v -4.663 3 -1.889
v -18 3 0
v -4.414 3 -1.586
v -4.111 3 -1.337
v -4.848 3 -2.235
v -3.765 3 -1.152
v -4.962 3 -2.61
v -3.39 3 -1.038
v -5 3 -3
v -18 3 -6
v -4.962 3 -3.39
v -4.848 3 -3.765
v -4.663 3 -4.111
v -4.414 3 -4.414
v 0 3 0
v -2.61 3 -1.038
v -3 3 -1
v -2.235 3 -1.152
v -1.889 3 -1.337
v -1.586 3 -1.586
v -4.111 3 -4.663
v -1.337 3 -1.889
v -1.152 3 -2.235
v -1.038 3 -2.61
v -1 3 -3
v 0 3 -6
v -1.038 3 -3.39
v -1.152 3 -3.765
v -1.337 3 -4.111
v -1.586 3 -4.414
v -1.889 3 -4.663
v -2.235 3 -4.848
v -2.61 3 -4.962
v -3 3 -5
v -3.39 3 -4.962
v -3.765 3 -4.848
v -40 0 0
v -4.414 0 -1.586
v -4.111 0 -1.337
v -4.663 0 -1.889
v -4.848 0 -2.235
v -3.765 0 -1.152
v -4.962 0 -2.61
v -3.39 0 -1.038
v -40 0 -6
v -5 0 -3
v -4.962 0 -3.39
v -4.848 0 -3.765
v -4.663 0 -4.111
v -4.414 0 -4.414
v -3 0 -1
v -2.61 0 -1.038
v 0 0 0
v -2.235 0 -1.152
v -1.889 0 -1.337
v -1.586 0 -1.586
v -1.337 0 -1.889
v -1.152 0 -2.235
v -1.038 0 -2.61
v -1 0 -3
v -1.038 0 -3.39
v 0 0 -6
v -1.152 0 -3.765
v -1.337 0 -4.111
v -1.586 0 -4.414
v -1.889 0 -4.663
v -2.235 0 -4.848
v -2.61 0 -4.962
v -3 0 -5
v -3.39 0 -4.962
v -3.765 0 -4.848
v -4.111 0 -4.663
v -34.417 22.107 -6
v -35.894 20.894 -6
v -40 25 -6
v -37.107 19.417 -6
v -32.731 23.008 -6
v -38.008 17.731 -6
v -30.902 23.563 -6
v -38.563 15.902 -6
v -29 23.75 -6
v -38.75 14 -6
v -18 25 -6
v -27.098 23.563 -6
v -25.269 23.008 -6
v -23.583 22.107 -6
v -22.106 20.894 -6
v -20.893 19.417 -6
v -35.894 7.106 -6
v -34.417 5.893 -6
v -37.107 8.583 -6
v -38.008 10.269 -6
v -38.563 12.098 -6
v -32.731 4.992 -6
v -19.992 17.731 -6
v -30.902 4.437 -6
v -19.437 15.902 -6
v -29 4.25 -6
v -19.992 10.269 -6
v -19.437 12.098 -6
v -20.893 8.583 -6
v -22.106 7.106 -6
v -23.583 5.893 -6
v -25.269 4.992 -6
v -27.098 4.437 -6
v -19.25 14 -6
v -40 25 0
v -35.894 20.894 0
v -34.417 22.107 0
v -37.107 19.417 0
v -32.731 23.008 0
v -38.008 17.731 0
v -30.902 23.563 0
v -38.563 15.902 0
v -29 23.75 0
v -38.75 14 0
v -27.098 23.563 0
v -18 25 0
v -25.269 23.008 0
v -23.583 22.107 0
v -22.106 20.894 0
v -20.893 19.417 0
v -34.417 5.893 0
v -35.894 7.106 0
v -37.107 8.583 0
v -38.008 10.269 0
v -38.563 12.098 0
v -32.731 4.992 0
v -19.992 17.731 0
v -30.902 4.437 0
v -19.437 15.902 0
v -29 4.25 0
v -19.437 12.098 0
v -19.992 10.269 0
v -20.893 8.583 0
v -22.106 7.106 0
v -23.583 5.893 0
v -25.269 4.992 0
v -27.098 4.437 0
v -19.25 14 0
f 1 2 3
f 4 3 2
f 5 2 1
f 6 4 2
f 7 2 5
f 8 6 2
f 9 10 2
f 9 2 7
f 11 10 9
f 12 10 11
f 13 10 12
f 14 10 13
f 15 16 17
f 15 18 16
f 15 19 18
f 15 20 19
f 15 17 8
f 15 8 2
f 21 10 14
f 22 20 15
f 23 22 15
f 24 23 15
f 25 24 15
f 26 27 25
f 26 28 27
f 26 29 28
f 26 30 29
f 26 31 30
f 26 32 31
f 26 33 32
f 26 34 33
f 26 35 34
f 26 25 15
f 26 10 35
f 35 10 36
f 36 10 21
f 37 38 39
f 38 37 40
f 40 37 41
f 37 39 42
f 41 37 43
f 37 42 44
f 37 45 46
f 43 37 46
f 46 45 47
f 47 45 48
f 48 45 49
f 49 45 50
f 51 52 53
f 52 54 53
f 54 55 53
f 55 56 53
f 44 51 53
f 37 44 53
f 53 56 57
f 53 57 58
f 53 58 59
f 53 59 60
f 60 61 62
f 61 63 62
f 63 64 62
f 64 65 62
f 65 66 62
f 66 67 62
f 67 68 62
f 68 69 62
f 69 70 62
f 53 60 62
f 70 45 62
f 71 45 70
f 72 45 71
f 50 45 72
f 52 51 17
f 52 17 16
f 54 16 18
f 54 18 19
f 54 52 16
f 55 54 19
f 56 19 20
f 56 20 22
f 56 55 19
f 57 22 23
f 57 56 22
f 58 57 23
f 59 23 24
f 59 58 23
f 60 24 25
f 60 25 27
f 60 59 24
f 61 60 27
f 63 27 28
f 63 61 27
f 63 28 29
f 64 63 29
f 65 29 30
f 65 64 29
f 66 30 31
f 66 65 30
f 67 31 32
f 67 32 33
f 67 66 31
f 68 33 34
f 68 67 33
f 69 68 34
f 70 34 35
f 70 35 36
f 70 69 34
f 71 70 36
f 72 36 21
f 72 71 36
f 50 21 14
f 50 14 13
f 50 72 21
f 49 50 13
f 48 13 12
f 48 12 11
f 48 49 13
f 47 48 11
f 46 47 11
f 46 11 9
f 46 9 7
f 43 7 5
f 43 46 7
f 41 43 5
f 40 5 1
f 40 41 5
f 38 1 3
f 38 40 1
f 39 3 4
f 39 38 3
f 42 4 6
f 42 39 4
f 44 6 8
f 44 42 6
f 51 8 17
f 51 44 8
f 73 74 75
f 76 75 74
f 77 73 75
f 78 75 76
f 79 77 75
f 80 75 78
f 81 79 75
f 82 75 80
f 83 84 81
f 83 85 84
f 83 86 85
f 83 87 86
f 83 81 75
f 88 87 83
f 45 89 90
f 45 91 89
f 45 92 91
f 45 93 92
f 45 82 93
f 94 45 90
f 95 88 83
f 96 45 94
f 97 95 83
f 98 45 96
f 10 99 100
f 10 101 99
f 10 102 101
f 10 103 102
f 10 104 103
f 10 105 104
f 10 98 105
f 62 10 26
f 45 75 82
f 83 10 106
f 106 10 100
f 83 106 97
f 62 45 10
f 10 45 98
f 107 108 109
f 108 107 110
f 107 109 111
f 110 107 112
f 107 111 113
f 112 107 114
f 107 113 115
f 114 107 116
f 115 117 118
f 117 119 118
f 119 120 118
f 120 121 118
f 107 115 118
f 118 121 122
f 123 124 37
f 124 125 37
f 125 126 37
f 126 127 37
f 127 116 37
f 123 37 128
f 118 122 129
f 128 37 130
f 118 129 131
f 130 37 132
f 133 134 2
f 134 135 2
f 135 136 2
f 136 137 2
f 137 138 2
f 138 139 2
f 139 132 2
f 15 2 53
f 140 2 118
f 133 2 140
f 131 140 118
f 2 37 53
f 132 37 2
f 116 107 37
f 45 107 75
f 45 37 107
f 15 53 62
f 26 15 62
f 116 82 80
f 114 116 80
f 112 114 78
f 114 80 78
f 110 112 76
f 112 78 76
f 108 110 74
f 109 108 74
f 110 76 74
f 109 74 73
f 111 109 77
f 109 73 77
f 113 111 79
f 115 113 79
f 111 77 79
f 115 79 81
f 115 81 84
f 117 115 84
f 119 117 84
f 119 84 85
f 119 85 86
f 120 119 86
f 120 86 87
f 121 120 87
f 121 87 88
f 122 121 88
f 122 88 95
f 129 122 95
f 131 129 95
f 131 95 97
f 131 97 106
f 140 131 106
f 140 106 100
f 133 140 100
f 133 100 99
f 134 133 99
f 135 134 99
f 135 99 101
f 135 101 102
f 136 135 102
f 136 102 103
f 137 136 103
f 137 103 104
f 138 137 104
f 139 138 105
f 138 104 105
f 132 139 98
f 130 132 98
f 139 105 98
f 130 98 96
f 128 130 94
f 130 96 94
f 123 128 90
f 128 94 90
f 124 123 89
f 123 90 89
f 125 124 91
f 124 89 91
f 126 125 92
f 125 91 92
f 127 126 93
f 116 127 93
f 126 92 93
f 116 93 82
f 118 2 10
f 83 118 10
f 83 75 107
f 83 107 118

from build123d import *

# Parameters (mm, degrees)
SKETCH2_W           = 40
SKETCH2_H           = 6
SKETCH2_R           = 2
BOSS_EXTRUDE1_DEPTH = 3
SKETCH3_W           = 22
SKETCH3_H           = 6
BOSS_EXTRUDE2_DEPTH = 22
CUT_EXTRUDE1_REACH  = 49.55
SKETCH4_R           = 9.75


with BuildPart() as part:
    # Sketch2 → Boss-Extrude1 (new body)
    with BuildSketch(Plane(origin=(0, 0, 0), x_dir=(1, 0, 0), z_dir=(0, 1, 0))):
        with Locations((-20, 3)):
            Rectangle(SKETCH2_W, SKETCH2_H)
        with Locations(Location((-3, 3, 0), (0, 0, 270))):
            Circle(SKETCH2_R, mode=Mode.SUBTRACT)
    extrude(amount=BOSS_EXTRUDE1_DEPTH)

    # Sketch3 → Boss-Extrude2 (add)
    with BuildSketch(Plane(origin=(0, 3, 0), x_dir=(1, 0, 0), z_dir=(0, 1, 0))):
        with Locations((-29, 3)):
            Rectangle(SKETCH3_W, SKETCH3_H)
    extrude(amount=BOSS_EXTRUDE2_DEPTH)

    # Sketch4 → Cut-Extrude1 (cut, up to next)
    with BuildSketch(Plane(origin=(0, 0, -6), x_dir=(-1, 0, 0), z_dir=(0, 0, -1)), mode=Mode.PRIVATE) as cut_extrude1_sk1:
        with Locations((29, 14)):
            Circle(SKETCH4_R)
    cut_extrude1_tool1 = extrude(cut_extrude1_sk1.sketch, amount=-CUT_EXTRUDE1_REACH, mode=Mode.PRIVATE) & part.part
    add(cut_extrude1_tool1.solids().sort_by_distance((-29, 14, -6))[0], mode=Mode.SUBTRACT)


solid = part.part
